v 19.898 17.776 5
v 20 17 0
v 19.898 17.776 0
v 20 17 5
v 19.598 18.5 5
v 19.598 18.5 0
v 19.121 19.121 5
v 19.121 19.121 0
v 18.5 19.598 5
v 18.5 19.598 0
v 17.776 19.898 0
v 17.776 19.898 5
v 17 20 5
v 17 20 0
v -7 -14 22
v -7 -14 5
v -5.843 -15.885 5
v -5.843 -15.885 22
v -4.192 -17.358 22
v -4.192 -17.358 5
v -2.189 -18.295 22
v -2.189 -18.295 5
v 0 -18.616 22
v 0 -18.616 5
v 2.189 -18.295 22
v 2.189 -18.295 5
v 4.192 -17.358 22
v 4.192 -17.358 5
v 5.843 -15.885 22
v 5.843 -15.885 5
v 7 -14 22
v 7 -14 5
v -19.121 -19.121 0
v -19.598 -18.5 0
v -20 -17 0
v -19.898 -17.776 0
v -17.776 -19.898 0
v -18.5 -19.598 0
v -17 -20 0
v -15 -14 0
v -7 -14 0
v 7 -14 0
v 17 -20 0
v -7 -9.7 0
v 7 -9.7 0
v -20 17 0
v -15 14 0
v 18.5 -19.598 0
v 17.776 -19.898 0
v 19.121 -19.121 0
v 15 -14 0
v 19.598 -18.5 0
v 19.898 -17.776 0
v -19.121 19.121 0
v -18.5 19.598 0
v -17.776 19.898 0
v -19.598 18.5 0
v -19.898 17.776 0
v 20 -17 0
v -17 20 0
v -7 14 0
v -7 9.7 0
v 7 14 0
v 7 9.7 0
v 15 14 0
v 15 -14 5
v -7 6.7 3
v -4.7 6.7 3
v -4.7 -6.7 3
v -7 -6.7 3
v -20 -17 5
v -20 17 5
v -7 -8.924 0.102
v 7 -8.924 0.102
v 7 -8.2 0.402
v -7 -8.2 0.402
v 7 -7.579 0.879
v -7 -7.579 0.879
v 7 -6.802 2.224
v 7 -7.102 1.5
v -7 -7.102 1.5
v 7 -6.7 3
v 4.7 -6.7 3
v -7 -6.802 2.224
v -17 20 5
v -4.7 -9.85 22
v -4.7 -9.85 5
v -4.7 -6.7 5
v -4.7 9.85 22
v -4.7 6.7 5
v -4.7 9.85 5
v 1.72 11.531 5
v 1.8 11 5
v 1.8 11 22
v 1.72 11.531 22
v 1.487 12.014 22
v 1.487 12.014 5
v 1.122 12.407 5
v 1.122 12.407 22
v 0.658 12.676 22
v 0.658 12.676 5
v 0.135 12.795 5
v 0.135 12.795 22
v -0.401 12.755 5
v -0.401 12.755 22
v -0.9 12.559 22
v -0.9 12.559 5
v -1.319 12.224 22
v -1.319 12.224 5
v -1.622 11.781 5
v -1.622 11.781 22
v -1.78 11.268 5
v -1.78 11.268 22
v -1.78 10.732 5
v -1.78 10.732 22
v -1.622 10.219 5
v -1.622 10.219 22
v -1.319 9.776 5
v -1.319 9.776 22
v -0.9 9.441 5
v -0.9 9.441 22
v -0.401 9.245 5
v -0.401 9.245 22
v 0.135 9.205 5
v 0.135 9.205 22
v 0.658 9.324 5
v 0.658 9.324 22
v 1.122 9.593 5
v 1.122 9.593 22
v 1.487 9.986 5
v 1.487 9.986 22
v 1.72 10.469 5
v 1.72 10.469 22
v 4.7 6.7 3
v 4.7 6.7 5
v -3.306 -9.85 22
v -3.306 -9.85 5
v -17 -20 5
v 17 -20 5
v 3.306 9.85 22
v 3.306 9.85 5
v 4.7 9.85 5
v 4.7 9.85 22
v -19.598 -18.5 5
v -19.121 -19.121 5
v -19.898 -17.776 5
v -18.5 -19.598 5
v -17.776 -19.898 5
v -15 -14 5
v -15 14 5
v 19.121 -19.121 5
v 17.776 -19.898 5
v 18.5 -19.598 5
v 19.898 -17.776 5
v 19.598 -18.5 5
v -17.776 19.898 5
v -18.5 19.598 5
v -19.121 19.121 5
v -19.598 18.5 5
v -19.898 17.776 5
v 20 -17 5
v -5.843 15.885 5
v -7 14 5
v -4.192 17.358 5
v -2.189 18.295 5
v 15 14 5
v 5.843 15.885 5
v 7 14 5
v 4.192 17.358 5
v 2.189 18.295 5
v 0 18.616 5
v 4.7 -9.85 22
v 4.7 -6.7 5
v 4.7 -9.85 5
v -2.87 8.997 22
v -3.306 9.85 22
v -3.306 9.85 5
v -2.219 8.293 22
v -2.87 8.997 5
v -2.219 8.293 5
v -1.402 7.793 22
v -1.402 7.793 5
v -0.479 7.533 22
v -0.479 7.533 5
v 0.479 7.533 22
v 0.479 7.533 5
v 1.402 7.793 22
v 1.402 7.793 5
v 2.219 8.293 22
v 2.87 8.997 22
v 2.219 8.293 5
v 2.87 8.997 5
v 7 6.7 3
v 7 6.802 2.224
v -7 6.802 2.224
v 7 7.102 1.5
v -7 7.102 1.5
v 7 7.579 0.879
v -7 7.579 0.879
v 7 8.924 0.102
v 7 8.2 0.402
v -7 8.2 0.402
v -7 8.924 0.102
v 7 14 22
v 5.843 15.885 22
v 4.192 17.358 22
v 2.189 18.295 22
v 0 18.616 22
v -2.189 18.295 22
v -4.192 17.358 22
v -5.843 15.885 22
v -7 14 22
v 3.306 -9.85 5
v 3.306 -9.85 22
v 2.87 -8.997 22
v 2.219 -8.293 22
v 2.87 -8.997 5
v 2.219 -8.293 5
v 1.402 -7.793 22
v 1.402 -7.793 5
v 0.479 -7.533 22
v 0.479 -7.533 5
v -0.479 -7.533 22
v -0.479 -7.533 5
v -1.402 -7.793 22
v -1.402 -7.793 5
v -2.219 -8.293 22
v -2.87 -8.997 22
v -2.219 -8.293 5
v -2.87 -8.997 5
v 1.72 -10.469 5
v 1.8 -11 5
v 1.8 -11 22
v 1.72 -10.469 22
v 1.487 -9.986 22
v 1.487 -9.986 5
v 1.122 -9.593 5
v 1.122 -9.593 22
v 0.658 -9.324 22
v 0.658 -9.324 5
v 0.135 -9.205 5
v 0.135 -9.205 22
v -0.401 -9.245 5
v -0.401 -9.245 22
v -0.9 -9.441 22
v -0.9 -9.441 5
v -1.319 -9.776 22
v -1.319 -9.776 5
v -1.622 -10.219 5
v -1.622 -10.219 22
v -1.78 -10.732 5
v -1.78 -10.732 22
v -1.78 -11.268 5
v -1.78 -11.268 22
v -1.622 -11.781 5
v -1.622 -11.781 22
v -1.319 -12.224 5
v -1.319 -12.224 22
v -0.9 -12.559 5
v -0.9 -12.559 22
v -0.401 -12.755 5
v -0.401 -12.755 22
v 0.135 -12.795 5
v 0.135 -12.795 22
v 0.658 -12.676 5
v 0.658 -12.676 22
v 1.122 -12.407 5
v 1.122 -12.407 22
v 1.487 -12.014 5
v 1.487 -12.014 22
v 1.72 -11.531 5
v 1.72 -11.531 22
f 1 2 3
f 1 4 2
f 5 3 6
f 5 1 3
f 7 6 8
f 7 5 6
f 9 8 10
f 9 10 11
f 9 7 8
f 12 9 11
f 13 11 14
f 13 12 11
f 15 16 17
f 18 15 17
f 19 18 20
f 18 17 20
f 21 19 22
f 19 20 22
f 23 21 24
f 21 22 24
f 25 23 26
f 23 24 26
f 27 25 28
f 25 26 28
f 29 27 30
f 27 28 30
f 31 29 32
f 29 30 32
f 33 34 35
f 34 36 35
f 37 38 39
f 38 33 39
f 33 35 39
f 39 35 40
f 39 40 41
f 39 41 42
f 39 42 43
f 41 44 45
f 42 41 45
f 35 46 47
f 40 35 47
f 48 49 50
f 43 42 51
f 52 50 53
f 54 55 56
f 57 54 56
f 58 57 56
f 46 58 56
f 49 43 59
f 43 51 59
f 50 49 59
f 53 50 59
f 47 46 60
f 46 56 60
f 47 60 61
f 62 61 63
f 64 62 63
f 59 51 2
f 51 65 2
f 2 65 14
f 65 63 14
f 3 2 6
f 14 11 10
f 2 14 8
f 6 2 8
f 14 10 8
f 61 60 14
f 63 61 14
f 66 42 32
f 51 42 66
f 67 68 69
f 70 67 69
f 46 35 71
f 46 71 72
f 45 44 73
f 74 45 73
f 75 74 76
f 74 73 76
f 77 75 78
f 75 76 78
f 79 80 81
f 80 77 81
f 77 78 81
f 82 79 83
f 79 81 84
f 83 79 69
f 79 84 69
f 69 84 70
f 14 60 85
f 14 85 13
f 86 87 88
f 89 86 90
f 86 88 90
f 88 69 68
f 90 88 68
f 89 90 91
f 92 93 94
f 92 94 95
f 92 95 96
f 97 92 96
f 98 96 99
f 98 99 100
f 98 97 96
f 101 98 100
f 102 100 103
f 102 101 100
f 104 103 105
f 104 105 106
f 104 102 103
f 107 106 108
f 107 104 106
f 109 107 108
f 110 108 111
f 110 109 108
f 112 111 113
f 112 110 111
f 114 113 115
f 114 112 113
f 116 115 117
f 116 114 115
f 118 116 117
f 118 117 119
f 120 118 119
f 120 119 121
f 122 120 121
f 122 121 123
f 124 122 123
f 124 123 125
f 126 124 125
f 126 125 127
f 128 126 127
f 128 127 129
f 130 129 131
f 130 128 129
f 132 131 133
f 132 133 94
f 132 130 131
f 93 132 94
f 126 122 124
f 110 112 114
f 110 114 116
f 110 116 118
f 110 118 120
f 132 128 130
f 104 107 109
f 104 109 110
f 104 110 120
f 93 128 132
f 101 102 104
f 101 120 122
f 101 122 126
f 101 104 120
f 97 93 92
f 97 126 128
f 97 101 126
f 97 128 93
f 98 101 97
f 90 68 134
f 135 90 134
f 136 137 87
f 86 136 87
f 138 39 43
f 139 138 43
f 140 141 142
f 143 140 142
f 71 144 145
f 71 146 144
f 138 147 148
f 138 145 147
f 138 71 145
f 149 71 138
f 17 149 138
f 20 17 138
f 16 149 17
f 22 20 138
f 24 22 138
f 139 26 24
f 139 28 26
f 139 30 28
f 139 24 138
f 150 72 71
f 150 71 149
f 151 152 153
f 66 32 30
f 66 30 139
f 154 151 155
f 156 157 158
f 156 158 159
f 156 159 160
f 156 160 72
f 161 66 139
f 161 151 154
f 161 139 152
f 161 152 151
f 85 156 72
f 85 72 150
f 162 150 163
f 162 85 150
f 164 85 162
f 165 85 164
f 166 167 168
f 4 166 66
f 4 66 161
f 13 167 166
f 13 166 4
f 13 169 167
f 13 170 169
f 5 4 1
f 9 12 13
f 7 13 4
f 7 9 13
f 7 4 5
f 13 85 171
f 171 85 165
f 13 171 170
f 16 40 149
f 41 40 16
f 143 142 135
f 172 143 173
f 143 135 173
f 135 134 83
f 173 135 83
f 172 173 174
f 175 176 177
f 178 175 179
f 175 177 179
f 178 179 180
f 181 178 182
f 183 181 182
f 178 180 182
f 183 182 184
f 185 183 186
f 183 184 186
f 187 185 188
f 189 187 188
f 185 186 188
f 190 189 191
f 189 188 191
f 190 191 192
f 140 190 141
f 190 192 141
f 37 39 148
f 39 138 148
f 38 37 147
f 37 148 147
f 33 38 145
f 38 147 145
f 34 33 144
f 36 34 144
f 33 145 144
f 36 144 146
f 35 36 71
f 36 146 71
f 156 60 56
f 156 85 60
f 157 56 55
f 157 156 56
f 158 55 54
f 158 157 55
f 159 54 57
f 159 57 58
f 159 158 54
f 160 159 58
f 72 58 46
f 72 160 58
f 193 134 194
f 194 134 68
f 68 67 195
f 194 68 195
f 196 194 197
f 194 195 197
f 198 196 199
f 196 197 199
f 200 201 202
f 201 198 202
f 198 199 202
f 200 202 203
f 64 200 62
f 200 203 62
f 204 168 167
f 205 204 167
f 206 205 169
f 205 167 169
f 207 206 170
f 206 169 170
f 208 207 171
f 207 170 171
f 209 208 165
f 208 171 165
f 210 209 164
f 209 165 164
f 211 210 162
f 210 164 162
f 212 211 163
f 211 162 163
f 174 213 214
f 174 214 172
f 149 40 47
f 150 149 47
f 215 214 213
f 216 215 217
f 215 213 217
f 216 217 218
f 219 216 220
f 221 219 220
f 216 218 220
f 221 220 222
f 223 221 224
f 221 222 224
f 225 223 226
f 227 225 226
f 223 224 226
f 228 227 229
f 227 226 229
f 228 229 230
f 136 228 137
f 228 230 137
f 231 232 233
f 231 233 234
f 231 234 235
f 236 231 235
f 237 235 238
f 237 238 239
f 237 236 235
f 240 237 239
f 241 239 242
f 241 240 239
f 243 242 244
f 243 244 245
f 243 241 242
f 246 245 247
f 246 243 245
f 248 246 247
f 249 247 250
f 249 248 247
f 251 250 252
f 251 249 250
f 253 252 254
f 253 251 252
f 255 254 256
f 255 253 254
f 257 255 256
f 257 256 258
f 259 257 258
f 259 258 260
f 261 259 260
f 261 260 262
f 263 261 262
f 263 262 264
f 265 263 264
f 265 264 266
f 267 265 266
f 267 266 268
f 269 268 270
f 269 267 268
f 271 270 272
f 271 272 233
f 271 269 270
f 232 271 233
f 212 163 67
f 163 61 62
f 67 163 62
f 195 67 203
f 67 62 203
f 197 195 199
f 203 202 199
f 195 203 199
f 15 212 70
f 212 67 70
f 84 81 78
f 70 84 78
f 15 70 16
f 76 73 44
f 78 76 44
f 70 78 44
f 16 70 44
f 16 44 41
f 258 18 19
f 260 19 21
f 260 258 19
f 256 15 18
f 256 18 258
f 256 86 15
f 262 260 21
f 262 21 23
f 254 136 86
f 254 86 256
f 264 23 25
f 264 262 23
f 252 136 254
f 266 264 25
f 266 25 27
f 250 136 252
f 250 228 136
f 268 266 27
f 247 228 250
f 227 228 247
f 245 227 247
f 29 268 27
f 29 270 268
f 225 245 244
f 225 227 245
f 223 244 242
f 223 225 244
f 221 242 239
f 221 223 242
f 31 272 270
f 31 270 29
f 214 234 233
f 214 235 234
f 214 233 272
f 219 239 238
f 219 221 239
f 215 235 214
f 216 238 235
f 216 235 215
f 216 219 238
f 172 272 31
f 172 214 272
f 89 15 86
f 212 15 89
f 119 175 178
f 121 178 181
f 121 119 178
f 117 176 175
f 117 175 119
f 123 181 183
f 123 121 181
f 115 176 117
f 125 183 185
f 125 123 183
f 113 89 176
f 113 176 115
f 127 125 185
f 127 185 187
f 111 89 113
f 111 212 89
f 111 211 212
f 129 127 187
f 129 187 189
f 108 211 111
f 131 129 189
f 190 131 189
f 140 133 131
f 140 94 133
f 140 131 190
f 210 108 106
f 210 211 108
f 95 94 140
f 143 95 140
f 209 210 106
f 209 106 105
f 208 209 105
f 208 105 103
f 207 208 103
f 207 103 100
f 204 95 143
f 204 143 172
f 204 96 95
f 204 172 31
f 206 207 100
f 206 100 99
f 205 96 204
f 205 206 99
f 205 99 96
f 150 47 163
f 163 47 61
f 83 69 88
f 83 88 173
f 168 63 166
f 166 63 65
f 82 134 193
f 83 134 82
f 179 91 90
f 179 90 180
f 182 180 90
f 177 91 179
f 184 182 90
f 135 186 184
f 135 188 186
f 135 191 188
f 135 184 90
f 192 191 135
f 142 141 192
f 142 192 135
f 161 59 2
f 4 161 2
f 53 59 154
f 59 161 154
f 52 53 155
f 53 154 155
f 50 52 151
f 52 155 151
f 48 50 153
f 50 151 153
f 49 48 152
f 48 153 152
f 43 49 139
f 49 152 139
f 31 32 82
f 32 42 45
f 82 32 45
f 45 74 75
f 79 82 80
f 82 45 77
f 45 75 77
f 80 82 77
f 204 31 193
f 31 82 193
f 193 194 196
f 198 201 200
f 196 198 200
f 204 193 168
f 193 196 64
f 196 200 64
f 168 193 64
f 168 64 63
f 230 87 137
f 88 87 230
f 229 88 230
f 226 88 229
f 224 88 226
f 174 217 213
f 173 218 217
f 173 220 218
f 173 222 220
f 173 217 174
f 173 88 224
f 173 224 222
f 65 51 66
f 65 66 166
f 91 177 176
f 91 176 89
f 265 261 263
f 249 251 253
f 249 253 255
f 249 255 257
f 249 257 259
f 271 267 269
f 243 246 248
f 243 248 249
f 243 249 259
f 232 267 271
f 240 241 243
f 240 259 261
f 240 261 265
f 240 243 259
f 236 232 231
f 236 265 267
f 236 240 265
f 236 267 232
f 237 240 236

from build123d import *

# Parameters (mm, degrees)
SKETCH_W          = 40
SKETCH_H          = 40
SKETCH_W_2        = 8
SKETCH_H_2        = 28
SKETCH_W_3        = 9.4
SKETCH_H_3        = 13.4
PAD_DEPTH         = 5
SKETCH001_R       = 1.8
PAD001_DEPTH      = 17
POCKET_DEPTH      = 5
POCKET_DEPTH_BACK = -15
FILLET_R          = 3


with BuildPart() as part:
    # Sketch → Pad (new body)
    with BuildSketch(Plane.XY):
        Rectangle(SKETCH_W, SKETCH_H)
        with Locations((-11, 0)):
            Rectangle(SKETCH_W_2, SKETCH_H_2, mode=Mode.SUBTRACT)
        with Locations((11, 0)):
            Rectangle(SKETCH_W_2, SKETCH_H_2, mode=Mode.SUBTRACT)
        Rectangle(SKETCH_W_3, SKETCH_H_3, mode=Mode.SUBTRACT)
    extrude(amount=PAD_DEPTH)

    # Sketch001 (on Face18 of Pad) → Pad001 (join)
    with BuildSketch(Plane.XY.offset(5)):
        with BuildLine():
            Line((7, -14), (7, 14))
            ThreePointArc((7, 14), (0, 18.615773), (-7, 14))
            Line((-7, 14), (-7, -14))
            ThreePointArc((-7, -14), (0, -18.615773), (7, -14))
        make_face()
        with Locations((0, 11)):
            Circle(SKETCH001_R, mode=Mode.SUBTRACT)
        with Locations((0, -11)):
            Circle(SKETCH001_R, mode=Mode.SUBTRACT)
        with BuildLine():
            ThreePointArc((-3.305677, 9.85), (0, 7.5), (3.305677, 9.85))
            Line((3.305677, 9.85), (4.7, 9.85))
            Line((4.7, 9.85), (4.7, 0))
            Line((4.7, -9.85), (4.7, 0))
            Line((3.305677, -9.85), (4.7, -9.85))
            ThreePointArc((3.305677, -9.85), (0, -7.5), (-3.305677, -9.85))
            Line((-3.305677, -9.85), (-4.7, -9.85))
            Line((-4.7, -9.85), (-4.7, 0))
            Line((-4.7, 9.85), (-4.7, 0))
            Line((-3.305677, 9.85), (-4.7, 9.85))
        make_face(mode=Mode.SUBTRACT)
    extrude(amount=PAD001_DEPTH)

    # Sketch002 → Pocket (cut, two sides)
    with BuildSketch(Plane.YZ.offset(-4.7)) as pocket_sk:
        with BuildLine():
            ThreePointArc((-9.7, 0), (-7.57868, 0.87868), (-6.7, 3))
            Line((6.7, 3), (-6.7, 3))
            ThreePointArc((6.7, 3), (7.57868, 0.87868), (9.7, 0))
            Line((-9.7, 0), (9.7, 0))
        make_face()
    extrude(amount=-POCKET_DEPTH, mode=Mode.SUBTRACT)
    extrude(pocket_sk.sketch, amount=-POCKET_DEPTH_BACK, mode=Mode.SUBTRACT)

    # Fillet
    fillet_edges = [part.edges().sort_by_distance(p)[0] for p in [
        (20, 20, 2.5),
        (-20, 20, 2.5),
        (-20, -20, 2.5),
        (20, -20, 2.5),
    ]]
    fillet(fillet_edges, radius=FILLET_R)


solid = part.part
